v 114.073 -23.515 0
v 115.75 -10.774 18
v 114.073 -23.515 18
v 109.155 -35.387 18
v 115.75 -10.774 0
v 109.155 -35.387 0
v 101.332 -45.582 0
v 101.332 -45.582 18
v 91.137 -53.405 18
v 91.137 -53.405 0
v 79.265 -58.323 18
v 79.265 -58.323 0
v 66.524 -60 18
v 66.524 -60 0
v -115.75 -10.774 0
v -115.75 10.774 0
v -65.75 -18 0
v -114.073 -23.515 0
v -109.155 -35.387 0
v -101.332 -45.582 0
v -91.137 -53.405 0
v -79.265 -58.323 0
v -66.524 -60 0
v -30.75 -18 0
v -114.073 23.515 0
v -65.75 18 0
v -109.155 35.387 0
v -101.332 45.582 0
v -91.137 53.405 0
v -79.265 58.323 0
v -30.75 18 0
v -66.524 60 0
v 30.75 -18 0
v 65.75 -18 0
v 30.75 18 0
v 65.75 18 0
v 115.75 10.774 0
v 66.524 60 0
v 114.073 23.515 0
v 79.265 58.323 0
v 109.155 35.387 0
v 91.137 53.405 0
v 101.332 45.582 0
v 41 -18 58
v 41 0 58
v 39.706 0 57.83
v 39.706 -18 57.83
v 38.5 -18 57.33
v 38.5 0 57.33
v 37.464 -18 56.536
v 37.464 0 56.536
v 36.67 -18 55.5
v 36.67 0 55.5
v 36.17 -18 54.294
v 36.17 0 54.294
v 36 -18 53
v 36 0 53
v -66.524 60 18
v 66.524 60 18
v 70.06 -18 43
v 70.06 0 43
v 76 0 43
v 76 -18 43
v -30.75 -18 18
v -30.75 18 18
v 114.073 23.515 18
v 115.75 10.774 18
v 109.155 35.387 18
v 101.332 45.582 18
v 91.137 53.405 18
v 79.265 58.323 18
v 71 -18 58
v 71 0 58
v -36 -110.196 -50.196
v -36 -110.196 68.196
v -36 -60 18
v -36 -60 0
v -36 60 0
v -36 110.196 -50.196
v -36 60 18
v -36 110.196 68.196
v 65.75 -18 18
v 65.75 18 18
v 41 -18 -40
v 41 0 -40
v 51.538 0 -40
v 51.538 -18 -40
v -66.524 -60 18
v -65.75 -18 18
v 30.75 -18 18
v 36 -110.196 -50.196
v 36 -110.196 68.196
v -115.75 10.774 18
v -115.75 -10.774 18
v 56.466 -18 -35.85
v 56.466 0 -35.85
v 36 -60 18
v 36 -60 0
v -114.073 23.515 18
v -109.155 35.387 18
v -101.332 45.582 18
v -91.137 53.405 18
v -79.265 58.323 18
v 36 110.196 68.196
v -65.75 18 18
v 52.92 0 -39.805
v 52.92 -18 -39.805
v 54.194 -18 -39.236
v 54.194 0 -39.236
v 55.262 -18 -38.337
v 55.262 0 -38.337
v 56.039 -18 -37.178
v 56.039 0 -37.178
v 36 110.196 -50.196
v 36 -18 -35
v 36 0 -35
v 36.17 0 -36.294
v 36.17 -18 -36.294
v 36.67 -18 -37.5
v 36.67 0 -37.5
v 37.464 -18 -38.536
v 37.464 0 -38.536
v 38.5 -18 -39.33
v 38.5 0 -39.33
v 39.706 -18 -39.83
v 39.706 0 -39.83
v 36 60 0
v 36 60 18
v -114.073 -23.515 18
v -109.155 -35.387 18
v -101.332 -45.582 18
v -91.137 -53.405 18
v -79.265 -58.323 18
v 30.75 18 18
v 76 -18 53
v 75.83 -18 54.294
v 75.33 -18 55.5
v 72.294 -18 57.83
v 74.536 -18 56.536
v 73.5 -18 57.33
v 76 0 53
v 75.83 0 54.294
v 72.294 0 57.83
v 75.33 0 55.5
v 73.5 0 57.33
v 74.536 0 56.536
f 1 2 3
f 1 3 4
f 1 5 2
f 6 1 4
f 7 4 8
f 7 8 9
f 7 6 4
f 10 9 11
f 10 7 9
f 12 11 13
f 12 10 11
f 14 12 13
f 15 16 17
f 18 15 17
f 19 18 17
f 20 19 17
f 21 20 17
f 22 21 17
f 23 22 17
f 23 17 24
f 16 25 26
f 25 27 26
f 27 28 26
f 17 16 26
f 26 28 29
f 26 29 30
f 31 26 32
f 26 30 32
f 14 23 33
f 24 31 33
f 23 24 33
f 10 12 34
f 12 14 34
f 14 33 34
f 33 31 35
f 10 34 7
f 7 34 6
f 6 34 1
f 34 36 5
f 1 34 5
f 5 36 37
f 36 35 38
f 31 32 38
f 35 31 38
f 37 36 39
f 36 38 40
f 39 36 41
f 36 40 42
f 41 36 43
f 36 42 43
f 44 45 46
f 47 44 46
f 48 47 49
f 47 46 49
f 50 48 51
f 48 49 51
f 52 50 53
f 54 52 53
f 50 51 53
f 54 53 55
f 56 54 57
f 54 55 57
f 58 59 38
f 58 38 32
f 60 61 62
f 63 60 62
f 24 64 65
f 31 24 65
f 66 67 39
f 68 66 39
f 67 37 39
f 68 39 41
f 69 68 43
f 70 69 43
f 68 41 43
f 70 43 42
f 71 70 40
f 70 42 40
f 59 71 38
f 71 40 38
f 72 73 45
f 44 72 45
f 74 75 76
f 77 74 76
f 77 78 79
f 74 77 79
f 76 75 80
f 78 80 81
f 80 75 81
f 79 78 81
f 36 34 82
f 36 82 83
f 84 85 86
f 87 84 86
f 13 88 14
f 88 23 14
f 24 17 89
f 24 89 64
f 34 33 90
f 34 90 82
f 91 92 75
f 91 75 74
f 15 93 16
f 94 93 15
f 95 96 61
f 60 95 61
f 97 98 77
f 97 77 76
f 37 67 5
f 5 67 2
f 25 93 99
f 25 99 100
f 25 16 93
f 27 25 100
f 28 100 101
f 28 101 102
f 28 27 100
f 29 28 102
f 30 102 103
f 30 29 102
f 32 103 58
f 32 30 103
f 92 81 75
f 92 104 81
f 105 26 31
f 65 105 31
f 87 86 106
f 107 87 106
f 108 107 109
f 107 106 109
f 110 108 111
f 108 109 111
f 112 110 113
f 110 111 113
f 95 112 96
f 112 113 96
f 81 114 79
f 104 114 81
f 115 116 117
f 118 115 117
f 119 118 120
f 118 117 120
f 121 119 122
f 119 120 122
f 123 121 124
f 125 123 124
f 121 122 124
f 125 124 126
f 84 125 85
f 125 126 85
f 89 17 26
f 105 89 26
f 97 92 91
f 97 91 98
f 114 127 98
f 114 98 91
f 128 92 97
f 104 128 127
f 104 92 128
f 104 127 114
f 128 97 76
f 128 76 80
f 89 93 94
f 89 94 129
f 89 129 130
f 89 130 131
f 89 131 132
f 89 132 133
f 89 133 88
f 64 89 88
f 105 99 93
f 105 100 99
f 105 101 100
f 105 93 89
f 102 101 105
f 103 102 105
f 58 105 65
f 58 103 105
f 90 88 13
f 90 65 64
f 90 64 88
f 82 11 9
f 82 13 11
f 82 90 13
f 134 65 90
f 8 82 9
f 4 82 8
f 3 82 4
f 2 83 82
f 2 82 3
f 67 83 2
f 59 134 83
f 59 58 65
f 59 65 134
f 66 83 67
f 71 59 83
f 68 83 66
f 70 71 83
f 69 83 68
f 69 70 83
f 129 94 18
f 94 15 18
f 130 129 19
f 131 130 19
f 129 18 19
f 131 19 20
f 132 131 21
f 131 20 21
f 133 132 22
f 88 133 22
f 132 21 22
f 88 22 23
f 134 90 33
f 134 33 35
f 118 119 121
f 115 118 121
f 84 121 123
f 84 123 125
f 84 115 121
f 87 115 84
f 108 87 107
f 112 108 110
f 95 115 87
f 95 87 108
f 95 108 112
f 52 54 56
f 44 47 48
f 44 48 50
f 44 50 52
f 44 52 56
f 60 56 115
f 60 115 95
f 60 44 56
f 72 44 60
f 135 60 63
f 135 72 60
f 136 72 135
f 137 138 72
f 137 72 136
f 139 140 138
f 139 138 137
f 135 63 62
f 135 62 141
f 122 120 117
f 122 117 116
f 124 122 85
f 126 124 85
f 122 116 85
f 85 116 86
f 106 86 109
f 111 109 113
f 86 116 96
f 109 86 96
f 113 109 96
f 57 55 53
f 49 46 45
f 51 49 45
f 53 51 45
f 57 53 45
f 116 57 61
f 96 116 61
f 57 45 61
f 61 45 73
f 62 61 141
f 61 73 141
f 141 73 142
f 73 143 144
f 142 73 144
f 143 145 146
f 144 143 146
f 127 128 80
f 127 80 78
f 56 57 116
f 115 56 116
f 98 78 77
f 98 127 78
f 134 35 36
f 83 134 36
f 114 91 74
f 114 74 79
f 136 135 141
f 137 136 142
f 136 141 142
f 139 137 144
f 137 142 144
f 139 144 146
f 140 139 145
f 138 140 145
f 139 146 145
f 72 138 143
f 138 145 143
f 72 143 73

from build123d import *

# Parameters (mm, degrees)
F0_W      = 131.5
F0_H      = 36
F1_DEPTH  = 18
F3_DEPTH  = 36
F4_W      = 30.75
F4_H      = 36
F5_DEPTH  = 18
F7_DEPTH  = 25
F8_DEPTH  = 18
F9_R      = 49.2259593896
F11_DEPTH = 18


with BuildPart() as f1:
    # F0 (on Top) → F1 (new body)
    with BuildSketch(Plane.XY):
        with BuildLine():
            Line((-95.75, -60), (95.75, -60))
            ThreePointArc((95.75, -60), (131.1053390593, -45.3553390593), (145.75, -10))
            Line((145.75, -10), (145.75, 10))
            ThreePointArc((145.75, 10), (131.1053390593, 45.3553390593), (95.75, 60))
            Line((95.75, 60), (-95.75, 60))
            ThreePointArc((-95.75, 60), (-131.1053390593, 45.3553390593), (-145.75, 10))
            Line((-145.75, 10), (-145.75, -10))
            ThreePointArc((-145.75, -10), (-131.1053390593, -45.3553390593), (-95.75, -60))
        make_face()
        Rectangle(F0_W, F0_H, mode=Mode.SUBTRACT)
    extrude(amount=F1_DEPTH)

    # F4 (on face) → F5 (join, through all)
    with BuildSketch(Plane.XY.offset(18)):
        with Locations((-15.375, 0)):
            Rectangle(F4_W, F4_H)
        with Locations((15.375, 0)):
            Rectangle(F4_W, F4_H)
    extrude(amount=-F5_DEPTH)

    # F6 (on face) → F7 (cut)
    with BuildSketch(Plane.XY.offset(18)):
        with BuildLine():
            Line((-171.1352914572, -60), (-115.75, -60))
            Line((-115.75, -60), (-115.75, -55.8257569496))
            ThreePointArc((-115.75, -55.8257569496), (-137.5830013267, -37.3861278753), (-145.75, -10))
            Line((-145.75, -10), (-145.75, 10))
            ThreePointArc((-145.75, 10), (-137.5830013267, 37.3861278753), (-115.75, 55.8257569496))
            Line((-115.75, 55.8257569496), (-115.75, 60))
            Line((-115.75, 60), (-171.1352914572, 60))
            Line((-171.1352914572, 60), (-171.1352914572, -60))
        make_face()
        with BuildLine():
            Line((115.75, -55.8257569496), (115.75, -60))
            Line((115.75, -60), (180.9306442738, -60))
            Line((180.9306442738, -60), (180.9306442738, 60))
            Line((180.9306442738, 60), (115.75, 60))
            Line((115.75, 60), (115.75, 55.8257569496))
            ThreePointArc((115.75, 55.8257569496), (137.5830013267, 37.3861278753), (145.75, 10))
            Line((145.75, 10), (145.75, -10))
            ThreePointArc((145.75, -10), (137.5830013267, -37.3861278753), (115.75, -55.8257569496))
        make_face()
        with BuildLine():
            ThreePointArc((-145.75, -10), (-137.5830013267, -37.3861278753), (-115.75, -55.8257569496))
            Line((-115.75, -55.8257569496), (-115.75, 55.8257569496))
            ThreePointArc((-115.75, 55.8257569496), (-137.5830013267, 37.3861278753), (-145.75, 10))
            Line((-145.75, 10), (-145.75, -10))
        make_face()
        with BuildLine():
            Line((115.75, 55.8257569496), (115.75, -55.8257569496))
            ThreePointArc((115.75, -55.8257569496), (137.5830013267, -37.3861278753), (145.75, -10))
            Line((145.75, -10), (145.75, 10))
            ThreePointArc((145.75, 10), (137.5830013267, 37.3861278753), (115.75, 55.8257569496))
        make_face()
    extrude(amount=-F7_DEPTH, mode=Mode.SUBTRACT)

    # F6 (on face) → F8 (join)
    with BuildSketch(Plane.XY.offset(18)):
        with BuildLine():
            Line((-115.75, 60), (-115.75, 55.8257569496))
            ThreePointArc((-115.75, 55.8257569496), (-105.9654821845, 58.9453156465), (-95.75, 60))
            Line((-95.75, 60), (-115.75, 60))
        make_face()
        with BuildLine():
            ThreePointArc((95.75, 60), (105.9654821845, 58.9453156465), (115.75, 55.8257569496))
            Line((115.75, 55.8257569496), (115.75, 60))
            Line((115.75, 60), (95.75, 60))
        make_face()
        with BuildLine():
            ThreePointArc((115.75, -55.8257569496), (105.9654821845, -58.9453156465), (95.75, -60))
            Line((95.75, -60), (115.75, -60))
            Line((115.75, -60), (115.75, -55.8257569496))
        make_face()
        with BuildLine():
            Line((-115.75, -55.8257569496), (-115.75, -60))
            Line((-115.75, -60), (-95.75, -60))
            ThreePointArc((-95.75, -60), (-105.9654821845, -58.9453156465), (-115.75, -55.8257569496))
        make_face()
    extrude(amount=-F8_DEPTH)

    # F9
    f9_edges = [f1.edges().sort_by_distance(p)[0] for p in [
        (-115.75, 60, 9),
        (-115.75, -60, 9),
        (115.75, -60, 9),
        (115.75, 60, 9),
    ]]
    fillet(f9_edges, radius=F9_R)


with BuildPart() as f3:
    # F2 (on Right) → F3 (new body, symmetric)
    with BuildSketch(Plane.YZ):
        Polygon((110.1955026388, 68.1955026388), (10, 68.1955026388), (-10, 68.1955026388), (-110.1955026388, 68.1955026388), (-110.1955026388, -50.1955026388), (-10, -50.1955026388), (10, -50.1955026388), (110.1955026388, -50.1955026388), align=None)
        Polygon((-60, 0), (-60, 18), (-10, 18), (10, 18), (60, 18), (60, 0), (10, 0), (-10, 0), align=None, mode=Mode.SUBTRACT)
    extrude(amount=F3_DEPTH, both=True)


with BuildPart() as f11:
    # F10 (on Front) → F11 (new body)
    with BuildSketch(Plane.XZ):
        with BuildLine():
            ThreePointArc((41, 58), (37.4644660941, 56.5355339059), (36, 53))
            Line((36, 53), (36, 43))
            Line((36, 43), (36, 18))
            Line((36, 18), (65.75, 18))
            Line((65.75, 18), (70.0603448276, 43))
            Line((70.0603448276, 43), (76, 43))
            Line((76, 43), (76, 53))
            ThreePointArc((76, 53), (74.5355339059, 56.5355339059), (71, 58))
            Line((71, 58), (41, 58))
        make_face()
        with BuildLine():
            Line((65.75, 18), (36, 18))
            Line((36, 18), (36, 0))
            Line((36, 0), (36, -30))
            Line((36, -30), (36, -35))
            ThreePointArc((36, -35), (37.4644660941, -38.5355339059), (41, -40))
            Line((41, -40), (51.538296907, -40))
            ThreePointArc((51.538296907, -40), (54.7595022007, -38.8241125057), (56.4655974858, -35.8495345825))
            Line((56.4655974858, -35.8495345825), (65.75, 18))
        make_face()
    extrude(amount=F11_DEPTH)


solid = Compound([f1.part, f3.part, f11.part])
